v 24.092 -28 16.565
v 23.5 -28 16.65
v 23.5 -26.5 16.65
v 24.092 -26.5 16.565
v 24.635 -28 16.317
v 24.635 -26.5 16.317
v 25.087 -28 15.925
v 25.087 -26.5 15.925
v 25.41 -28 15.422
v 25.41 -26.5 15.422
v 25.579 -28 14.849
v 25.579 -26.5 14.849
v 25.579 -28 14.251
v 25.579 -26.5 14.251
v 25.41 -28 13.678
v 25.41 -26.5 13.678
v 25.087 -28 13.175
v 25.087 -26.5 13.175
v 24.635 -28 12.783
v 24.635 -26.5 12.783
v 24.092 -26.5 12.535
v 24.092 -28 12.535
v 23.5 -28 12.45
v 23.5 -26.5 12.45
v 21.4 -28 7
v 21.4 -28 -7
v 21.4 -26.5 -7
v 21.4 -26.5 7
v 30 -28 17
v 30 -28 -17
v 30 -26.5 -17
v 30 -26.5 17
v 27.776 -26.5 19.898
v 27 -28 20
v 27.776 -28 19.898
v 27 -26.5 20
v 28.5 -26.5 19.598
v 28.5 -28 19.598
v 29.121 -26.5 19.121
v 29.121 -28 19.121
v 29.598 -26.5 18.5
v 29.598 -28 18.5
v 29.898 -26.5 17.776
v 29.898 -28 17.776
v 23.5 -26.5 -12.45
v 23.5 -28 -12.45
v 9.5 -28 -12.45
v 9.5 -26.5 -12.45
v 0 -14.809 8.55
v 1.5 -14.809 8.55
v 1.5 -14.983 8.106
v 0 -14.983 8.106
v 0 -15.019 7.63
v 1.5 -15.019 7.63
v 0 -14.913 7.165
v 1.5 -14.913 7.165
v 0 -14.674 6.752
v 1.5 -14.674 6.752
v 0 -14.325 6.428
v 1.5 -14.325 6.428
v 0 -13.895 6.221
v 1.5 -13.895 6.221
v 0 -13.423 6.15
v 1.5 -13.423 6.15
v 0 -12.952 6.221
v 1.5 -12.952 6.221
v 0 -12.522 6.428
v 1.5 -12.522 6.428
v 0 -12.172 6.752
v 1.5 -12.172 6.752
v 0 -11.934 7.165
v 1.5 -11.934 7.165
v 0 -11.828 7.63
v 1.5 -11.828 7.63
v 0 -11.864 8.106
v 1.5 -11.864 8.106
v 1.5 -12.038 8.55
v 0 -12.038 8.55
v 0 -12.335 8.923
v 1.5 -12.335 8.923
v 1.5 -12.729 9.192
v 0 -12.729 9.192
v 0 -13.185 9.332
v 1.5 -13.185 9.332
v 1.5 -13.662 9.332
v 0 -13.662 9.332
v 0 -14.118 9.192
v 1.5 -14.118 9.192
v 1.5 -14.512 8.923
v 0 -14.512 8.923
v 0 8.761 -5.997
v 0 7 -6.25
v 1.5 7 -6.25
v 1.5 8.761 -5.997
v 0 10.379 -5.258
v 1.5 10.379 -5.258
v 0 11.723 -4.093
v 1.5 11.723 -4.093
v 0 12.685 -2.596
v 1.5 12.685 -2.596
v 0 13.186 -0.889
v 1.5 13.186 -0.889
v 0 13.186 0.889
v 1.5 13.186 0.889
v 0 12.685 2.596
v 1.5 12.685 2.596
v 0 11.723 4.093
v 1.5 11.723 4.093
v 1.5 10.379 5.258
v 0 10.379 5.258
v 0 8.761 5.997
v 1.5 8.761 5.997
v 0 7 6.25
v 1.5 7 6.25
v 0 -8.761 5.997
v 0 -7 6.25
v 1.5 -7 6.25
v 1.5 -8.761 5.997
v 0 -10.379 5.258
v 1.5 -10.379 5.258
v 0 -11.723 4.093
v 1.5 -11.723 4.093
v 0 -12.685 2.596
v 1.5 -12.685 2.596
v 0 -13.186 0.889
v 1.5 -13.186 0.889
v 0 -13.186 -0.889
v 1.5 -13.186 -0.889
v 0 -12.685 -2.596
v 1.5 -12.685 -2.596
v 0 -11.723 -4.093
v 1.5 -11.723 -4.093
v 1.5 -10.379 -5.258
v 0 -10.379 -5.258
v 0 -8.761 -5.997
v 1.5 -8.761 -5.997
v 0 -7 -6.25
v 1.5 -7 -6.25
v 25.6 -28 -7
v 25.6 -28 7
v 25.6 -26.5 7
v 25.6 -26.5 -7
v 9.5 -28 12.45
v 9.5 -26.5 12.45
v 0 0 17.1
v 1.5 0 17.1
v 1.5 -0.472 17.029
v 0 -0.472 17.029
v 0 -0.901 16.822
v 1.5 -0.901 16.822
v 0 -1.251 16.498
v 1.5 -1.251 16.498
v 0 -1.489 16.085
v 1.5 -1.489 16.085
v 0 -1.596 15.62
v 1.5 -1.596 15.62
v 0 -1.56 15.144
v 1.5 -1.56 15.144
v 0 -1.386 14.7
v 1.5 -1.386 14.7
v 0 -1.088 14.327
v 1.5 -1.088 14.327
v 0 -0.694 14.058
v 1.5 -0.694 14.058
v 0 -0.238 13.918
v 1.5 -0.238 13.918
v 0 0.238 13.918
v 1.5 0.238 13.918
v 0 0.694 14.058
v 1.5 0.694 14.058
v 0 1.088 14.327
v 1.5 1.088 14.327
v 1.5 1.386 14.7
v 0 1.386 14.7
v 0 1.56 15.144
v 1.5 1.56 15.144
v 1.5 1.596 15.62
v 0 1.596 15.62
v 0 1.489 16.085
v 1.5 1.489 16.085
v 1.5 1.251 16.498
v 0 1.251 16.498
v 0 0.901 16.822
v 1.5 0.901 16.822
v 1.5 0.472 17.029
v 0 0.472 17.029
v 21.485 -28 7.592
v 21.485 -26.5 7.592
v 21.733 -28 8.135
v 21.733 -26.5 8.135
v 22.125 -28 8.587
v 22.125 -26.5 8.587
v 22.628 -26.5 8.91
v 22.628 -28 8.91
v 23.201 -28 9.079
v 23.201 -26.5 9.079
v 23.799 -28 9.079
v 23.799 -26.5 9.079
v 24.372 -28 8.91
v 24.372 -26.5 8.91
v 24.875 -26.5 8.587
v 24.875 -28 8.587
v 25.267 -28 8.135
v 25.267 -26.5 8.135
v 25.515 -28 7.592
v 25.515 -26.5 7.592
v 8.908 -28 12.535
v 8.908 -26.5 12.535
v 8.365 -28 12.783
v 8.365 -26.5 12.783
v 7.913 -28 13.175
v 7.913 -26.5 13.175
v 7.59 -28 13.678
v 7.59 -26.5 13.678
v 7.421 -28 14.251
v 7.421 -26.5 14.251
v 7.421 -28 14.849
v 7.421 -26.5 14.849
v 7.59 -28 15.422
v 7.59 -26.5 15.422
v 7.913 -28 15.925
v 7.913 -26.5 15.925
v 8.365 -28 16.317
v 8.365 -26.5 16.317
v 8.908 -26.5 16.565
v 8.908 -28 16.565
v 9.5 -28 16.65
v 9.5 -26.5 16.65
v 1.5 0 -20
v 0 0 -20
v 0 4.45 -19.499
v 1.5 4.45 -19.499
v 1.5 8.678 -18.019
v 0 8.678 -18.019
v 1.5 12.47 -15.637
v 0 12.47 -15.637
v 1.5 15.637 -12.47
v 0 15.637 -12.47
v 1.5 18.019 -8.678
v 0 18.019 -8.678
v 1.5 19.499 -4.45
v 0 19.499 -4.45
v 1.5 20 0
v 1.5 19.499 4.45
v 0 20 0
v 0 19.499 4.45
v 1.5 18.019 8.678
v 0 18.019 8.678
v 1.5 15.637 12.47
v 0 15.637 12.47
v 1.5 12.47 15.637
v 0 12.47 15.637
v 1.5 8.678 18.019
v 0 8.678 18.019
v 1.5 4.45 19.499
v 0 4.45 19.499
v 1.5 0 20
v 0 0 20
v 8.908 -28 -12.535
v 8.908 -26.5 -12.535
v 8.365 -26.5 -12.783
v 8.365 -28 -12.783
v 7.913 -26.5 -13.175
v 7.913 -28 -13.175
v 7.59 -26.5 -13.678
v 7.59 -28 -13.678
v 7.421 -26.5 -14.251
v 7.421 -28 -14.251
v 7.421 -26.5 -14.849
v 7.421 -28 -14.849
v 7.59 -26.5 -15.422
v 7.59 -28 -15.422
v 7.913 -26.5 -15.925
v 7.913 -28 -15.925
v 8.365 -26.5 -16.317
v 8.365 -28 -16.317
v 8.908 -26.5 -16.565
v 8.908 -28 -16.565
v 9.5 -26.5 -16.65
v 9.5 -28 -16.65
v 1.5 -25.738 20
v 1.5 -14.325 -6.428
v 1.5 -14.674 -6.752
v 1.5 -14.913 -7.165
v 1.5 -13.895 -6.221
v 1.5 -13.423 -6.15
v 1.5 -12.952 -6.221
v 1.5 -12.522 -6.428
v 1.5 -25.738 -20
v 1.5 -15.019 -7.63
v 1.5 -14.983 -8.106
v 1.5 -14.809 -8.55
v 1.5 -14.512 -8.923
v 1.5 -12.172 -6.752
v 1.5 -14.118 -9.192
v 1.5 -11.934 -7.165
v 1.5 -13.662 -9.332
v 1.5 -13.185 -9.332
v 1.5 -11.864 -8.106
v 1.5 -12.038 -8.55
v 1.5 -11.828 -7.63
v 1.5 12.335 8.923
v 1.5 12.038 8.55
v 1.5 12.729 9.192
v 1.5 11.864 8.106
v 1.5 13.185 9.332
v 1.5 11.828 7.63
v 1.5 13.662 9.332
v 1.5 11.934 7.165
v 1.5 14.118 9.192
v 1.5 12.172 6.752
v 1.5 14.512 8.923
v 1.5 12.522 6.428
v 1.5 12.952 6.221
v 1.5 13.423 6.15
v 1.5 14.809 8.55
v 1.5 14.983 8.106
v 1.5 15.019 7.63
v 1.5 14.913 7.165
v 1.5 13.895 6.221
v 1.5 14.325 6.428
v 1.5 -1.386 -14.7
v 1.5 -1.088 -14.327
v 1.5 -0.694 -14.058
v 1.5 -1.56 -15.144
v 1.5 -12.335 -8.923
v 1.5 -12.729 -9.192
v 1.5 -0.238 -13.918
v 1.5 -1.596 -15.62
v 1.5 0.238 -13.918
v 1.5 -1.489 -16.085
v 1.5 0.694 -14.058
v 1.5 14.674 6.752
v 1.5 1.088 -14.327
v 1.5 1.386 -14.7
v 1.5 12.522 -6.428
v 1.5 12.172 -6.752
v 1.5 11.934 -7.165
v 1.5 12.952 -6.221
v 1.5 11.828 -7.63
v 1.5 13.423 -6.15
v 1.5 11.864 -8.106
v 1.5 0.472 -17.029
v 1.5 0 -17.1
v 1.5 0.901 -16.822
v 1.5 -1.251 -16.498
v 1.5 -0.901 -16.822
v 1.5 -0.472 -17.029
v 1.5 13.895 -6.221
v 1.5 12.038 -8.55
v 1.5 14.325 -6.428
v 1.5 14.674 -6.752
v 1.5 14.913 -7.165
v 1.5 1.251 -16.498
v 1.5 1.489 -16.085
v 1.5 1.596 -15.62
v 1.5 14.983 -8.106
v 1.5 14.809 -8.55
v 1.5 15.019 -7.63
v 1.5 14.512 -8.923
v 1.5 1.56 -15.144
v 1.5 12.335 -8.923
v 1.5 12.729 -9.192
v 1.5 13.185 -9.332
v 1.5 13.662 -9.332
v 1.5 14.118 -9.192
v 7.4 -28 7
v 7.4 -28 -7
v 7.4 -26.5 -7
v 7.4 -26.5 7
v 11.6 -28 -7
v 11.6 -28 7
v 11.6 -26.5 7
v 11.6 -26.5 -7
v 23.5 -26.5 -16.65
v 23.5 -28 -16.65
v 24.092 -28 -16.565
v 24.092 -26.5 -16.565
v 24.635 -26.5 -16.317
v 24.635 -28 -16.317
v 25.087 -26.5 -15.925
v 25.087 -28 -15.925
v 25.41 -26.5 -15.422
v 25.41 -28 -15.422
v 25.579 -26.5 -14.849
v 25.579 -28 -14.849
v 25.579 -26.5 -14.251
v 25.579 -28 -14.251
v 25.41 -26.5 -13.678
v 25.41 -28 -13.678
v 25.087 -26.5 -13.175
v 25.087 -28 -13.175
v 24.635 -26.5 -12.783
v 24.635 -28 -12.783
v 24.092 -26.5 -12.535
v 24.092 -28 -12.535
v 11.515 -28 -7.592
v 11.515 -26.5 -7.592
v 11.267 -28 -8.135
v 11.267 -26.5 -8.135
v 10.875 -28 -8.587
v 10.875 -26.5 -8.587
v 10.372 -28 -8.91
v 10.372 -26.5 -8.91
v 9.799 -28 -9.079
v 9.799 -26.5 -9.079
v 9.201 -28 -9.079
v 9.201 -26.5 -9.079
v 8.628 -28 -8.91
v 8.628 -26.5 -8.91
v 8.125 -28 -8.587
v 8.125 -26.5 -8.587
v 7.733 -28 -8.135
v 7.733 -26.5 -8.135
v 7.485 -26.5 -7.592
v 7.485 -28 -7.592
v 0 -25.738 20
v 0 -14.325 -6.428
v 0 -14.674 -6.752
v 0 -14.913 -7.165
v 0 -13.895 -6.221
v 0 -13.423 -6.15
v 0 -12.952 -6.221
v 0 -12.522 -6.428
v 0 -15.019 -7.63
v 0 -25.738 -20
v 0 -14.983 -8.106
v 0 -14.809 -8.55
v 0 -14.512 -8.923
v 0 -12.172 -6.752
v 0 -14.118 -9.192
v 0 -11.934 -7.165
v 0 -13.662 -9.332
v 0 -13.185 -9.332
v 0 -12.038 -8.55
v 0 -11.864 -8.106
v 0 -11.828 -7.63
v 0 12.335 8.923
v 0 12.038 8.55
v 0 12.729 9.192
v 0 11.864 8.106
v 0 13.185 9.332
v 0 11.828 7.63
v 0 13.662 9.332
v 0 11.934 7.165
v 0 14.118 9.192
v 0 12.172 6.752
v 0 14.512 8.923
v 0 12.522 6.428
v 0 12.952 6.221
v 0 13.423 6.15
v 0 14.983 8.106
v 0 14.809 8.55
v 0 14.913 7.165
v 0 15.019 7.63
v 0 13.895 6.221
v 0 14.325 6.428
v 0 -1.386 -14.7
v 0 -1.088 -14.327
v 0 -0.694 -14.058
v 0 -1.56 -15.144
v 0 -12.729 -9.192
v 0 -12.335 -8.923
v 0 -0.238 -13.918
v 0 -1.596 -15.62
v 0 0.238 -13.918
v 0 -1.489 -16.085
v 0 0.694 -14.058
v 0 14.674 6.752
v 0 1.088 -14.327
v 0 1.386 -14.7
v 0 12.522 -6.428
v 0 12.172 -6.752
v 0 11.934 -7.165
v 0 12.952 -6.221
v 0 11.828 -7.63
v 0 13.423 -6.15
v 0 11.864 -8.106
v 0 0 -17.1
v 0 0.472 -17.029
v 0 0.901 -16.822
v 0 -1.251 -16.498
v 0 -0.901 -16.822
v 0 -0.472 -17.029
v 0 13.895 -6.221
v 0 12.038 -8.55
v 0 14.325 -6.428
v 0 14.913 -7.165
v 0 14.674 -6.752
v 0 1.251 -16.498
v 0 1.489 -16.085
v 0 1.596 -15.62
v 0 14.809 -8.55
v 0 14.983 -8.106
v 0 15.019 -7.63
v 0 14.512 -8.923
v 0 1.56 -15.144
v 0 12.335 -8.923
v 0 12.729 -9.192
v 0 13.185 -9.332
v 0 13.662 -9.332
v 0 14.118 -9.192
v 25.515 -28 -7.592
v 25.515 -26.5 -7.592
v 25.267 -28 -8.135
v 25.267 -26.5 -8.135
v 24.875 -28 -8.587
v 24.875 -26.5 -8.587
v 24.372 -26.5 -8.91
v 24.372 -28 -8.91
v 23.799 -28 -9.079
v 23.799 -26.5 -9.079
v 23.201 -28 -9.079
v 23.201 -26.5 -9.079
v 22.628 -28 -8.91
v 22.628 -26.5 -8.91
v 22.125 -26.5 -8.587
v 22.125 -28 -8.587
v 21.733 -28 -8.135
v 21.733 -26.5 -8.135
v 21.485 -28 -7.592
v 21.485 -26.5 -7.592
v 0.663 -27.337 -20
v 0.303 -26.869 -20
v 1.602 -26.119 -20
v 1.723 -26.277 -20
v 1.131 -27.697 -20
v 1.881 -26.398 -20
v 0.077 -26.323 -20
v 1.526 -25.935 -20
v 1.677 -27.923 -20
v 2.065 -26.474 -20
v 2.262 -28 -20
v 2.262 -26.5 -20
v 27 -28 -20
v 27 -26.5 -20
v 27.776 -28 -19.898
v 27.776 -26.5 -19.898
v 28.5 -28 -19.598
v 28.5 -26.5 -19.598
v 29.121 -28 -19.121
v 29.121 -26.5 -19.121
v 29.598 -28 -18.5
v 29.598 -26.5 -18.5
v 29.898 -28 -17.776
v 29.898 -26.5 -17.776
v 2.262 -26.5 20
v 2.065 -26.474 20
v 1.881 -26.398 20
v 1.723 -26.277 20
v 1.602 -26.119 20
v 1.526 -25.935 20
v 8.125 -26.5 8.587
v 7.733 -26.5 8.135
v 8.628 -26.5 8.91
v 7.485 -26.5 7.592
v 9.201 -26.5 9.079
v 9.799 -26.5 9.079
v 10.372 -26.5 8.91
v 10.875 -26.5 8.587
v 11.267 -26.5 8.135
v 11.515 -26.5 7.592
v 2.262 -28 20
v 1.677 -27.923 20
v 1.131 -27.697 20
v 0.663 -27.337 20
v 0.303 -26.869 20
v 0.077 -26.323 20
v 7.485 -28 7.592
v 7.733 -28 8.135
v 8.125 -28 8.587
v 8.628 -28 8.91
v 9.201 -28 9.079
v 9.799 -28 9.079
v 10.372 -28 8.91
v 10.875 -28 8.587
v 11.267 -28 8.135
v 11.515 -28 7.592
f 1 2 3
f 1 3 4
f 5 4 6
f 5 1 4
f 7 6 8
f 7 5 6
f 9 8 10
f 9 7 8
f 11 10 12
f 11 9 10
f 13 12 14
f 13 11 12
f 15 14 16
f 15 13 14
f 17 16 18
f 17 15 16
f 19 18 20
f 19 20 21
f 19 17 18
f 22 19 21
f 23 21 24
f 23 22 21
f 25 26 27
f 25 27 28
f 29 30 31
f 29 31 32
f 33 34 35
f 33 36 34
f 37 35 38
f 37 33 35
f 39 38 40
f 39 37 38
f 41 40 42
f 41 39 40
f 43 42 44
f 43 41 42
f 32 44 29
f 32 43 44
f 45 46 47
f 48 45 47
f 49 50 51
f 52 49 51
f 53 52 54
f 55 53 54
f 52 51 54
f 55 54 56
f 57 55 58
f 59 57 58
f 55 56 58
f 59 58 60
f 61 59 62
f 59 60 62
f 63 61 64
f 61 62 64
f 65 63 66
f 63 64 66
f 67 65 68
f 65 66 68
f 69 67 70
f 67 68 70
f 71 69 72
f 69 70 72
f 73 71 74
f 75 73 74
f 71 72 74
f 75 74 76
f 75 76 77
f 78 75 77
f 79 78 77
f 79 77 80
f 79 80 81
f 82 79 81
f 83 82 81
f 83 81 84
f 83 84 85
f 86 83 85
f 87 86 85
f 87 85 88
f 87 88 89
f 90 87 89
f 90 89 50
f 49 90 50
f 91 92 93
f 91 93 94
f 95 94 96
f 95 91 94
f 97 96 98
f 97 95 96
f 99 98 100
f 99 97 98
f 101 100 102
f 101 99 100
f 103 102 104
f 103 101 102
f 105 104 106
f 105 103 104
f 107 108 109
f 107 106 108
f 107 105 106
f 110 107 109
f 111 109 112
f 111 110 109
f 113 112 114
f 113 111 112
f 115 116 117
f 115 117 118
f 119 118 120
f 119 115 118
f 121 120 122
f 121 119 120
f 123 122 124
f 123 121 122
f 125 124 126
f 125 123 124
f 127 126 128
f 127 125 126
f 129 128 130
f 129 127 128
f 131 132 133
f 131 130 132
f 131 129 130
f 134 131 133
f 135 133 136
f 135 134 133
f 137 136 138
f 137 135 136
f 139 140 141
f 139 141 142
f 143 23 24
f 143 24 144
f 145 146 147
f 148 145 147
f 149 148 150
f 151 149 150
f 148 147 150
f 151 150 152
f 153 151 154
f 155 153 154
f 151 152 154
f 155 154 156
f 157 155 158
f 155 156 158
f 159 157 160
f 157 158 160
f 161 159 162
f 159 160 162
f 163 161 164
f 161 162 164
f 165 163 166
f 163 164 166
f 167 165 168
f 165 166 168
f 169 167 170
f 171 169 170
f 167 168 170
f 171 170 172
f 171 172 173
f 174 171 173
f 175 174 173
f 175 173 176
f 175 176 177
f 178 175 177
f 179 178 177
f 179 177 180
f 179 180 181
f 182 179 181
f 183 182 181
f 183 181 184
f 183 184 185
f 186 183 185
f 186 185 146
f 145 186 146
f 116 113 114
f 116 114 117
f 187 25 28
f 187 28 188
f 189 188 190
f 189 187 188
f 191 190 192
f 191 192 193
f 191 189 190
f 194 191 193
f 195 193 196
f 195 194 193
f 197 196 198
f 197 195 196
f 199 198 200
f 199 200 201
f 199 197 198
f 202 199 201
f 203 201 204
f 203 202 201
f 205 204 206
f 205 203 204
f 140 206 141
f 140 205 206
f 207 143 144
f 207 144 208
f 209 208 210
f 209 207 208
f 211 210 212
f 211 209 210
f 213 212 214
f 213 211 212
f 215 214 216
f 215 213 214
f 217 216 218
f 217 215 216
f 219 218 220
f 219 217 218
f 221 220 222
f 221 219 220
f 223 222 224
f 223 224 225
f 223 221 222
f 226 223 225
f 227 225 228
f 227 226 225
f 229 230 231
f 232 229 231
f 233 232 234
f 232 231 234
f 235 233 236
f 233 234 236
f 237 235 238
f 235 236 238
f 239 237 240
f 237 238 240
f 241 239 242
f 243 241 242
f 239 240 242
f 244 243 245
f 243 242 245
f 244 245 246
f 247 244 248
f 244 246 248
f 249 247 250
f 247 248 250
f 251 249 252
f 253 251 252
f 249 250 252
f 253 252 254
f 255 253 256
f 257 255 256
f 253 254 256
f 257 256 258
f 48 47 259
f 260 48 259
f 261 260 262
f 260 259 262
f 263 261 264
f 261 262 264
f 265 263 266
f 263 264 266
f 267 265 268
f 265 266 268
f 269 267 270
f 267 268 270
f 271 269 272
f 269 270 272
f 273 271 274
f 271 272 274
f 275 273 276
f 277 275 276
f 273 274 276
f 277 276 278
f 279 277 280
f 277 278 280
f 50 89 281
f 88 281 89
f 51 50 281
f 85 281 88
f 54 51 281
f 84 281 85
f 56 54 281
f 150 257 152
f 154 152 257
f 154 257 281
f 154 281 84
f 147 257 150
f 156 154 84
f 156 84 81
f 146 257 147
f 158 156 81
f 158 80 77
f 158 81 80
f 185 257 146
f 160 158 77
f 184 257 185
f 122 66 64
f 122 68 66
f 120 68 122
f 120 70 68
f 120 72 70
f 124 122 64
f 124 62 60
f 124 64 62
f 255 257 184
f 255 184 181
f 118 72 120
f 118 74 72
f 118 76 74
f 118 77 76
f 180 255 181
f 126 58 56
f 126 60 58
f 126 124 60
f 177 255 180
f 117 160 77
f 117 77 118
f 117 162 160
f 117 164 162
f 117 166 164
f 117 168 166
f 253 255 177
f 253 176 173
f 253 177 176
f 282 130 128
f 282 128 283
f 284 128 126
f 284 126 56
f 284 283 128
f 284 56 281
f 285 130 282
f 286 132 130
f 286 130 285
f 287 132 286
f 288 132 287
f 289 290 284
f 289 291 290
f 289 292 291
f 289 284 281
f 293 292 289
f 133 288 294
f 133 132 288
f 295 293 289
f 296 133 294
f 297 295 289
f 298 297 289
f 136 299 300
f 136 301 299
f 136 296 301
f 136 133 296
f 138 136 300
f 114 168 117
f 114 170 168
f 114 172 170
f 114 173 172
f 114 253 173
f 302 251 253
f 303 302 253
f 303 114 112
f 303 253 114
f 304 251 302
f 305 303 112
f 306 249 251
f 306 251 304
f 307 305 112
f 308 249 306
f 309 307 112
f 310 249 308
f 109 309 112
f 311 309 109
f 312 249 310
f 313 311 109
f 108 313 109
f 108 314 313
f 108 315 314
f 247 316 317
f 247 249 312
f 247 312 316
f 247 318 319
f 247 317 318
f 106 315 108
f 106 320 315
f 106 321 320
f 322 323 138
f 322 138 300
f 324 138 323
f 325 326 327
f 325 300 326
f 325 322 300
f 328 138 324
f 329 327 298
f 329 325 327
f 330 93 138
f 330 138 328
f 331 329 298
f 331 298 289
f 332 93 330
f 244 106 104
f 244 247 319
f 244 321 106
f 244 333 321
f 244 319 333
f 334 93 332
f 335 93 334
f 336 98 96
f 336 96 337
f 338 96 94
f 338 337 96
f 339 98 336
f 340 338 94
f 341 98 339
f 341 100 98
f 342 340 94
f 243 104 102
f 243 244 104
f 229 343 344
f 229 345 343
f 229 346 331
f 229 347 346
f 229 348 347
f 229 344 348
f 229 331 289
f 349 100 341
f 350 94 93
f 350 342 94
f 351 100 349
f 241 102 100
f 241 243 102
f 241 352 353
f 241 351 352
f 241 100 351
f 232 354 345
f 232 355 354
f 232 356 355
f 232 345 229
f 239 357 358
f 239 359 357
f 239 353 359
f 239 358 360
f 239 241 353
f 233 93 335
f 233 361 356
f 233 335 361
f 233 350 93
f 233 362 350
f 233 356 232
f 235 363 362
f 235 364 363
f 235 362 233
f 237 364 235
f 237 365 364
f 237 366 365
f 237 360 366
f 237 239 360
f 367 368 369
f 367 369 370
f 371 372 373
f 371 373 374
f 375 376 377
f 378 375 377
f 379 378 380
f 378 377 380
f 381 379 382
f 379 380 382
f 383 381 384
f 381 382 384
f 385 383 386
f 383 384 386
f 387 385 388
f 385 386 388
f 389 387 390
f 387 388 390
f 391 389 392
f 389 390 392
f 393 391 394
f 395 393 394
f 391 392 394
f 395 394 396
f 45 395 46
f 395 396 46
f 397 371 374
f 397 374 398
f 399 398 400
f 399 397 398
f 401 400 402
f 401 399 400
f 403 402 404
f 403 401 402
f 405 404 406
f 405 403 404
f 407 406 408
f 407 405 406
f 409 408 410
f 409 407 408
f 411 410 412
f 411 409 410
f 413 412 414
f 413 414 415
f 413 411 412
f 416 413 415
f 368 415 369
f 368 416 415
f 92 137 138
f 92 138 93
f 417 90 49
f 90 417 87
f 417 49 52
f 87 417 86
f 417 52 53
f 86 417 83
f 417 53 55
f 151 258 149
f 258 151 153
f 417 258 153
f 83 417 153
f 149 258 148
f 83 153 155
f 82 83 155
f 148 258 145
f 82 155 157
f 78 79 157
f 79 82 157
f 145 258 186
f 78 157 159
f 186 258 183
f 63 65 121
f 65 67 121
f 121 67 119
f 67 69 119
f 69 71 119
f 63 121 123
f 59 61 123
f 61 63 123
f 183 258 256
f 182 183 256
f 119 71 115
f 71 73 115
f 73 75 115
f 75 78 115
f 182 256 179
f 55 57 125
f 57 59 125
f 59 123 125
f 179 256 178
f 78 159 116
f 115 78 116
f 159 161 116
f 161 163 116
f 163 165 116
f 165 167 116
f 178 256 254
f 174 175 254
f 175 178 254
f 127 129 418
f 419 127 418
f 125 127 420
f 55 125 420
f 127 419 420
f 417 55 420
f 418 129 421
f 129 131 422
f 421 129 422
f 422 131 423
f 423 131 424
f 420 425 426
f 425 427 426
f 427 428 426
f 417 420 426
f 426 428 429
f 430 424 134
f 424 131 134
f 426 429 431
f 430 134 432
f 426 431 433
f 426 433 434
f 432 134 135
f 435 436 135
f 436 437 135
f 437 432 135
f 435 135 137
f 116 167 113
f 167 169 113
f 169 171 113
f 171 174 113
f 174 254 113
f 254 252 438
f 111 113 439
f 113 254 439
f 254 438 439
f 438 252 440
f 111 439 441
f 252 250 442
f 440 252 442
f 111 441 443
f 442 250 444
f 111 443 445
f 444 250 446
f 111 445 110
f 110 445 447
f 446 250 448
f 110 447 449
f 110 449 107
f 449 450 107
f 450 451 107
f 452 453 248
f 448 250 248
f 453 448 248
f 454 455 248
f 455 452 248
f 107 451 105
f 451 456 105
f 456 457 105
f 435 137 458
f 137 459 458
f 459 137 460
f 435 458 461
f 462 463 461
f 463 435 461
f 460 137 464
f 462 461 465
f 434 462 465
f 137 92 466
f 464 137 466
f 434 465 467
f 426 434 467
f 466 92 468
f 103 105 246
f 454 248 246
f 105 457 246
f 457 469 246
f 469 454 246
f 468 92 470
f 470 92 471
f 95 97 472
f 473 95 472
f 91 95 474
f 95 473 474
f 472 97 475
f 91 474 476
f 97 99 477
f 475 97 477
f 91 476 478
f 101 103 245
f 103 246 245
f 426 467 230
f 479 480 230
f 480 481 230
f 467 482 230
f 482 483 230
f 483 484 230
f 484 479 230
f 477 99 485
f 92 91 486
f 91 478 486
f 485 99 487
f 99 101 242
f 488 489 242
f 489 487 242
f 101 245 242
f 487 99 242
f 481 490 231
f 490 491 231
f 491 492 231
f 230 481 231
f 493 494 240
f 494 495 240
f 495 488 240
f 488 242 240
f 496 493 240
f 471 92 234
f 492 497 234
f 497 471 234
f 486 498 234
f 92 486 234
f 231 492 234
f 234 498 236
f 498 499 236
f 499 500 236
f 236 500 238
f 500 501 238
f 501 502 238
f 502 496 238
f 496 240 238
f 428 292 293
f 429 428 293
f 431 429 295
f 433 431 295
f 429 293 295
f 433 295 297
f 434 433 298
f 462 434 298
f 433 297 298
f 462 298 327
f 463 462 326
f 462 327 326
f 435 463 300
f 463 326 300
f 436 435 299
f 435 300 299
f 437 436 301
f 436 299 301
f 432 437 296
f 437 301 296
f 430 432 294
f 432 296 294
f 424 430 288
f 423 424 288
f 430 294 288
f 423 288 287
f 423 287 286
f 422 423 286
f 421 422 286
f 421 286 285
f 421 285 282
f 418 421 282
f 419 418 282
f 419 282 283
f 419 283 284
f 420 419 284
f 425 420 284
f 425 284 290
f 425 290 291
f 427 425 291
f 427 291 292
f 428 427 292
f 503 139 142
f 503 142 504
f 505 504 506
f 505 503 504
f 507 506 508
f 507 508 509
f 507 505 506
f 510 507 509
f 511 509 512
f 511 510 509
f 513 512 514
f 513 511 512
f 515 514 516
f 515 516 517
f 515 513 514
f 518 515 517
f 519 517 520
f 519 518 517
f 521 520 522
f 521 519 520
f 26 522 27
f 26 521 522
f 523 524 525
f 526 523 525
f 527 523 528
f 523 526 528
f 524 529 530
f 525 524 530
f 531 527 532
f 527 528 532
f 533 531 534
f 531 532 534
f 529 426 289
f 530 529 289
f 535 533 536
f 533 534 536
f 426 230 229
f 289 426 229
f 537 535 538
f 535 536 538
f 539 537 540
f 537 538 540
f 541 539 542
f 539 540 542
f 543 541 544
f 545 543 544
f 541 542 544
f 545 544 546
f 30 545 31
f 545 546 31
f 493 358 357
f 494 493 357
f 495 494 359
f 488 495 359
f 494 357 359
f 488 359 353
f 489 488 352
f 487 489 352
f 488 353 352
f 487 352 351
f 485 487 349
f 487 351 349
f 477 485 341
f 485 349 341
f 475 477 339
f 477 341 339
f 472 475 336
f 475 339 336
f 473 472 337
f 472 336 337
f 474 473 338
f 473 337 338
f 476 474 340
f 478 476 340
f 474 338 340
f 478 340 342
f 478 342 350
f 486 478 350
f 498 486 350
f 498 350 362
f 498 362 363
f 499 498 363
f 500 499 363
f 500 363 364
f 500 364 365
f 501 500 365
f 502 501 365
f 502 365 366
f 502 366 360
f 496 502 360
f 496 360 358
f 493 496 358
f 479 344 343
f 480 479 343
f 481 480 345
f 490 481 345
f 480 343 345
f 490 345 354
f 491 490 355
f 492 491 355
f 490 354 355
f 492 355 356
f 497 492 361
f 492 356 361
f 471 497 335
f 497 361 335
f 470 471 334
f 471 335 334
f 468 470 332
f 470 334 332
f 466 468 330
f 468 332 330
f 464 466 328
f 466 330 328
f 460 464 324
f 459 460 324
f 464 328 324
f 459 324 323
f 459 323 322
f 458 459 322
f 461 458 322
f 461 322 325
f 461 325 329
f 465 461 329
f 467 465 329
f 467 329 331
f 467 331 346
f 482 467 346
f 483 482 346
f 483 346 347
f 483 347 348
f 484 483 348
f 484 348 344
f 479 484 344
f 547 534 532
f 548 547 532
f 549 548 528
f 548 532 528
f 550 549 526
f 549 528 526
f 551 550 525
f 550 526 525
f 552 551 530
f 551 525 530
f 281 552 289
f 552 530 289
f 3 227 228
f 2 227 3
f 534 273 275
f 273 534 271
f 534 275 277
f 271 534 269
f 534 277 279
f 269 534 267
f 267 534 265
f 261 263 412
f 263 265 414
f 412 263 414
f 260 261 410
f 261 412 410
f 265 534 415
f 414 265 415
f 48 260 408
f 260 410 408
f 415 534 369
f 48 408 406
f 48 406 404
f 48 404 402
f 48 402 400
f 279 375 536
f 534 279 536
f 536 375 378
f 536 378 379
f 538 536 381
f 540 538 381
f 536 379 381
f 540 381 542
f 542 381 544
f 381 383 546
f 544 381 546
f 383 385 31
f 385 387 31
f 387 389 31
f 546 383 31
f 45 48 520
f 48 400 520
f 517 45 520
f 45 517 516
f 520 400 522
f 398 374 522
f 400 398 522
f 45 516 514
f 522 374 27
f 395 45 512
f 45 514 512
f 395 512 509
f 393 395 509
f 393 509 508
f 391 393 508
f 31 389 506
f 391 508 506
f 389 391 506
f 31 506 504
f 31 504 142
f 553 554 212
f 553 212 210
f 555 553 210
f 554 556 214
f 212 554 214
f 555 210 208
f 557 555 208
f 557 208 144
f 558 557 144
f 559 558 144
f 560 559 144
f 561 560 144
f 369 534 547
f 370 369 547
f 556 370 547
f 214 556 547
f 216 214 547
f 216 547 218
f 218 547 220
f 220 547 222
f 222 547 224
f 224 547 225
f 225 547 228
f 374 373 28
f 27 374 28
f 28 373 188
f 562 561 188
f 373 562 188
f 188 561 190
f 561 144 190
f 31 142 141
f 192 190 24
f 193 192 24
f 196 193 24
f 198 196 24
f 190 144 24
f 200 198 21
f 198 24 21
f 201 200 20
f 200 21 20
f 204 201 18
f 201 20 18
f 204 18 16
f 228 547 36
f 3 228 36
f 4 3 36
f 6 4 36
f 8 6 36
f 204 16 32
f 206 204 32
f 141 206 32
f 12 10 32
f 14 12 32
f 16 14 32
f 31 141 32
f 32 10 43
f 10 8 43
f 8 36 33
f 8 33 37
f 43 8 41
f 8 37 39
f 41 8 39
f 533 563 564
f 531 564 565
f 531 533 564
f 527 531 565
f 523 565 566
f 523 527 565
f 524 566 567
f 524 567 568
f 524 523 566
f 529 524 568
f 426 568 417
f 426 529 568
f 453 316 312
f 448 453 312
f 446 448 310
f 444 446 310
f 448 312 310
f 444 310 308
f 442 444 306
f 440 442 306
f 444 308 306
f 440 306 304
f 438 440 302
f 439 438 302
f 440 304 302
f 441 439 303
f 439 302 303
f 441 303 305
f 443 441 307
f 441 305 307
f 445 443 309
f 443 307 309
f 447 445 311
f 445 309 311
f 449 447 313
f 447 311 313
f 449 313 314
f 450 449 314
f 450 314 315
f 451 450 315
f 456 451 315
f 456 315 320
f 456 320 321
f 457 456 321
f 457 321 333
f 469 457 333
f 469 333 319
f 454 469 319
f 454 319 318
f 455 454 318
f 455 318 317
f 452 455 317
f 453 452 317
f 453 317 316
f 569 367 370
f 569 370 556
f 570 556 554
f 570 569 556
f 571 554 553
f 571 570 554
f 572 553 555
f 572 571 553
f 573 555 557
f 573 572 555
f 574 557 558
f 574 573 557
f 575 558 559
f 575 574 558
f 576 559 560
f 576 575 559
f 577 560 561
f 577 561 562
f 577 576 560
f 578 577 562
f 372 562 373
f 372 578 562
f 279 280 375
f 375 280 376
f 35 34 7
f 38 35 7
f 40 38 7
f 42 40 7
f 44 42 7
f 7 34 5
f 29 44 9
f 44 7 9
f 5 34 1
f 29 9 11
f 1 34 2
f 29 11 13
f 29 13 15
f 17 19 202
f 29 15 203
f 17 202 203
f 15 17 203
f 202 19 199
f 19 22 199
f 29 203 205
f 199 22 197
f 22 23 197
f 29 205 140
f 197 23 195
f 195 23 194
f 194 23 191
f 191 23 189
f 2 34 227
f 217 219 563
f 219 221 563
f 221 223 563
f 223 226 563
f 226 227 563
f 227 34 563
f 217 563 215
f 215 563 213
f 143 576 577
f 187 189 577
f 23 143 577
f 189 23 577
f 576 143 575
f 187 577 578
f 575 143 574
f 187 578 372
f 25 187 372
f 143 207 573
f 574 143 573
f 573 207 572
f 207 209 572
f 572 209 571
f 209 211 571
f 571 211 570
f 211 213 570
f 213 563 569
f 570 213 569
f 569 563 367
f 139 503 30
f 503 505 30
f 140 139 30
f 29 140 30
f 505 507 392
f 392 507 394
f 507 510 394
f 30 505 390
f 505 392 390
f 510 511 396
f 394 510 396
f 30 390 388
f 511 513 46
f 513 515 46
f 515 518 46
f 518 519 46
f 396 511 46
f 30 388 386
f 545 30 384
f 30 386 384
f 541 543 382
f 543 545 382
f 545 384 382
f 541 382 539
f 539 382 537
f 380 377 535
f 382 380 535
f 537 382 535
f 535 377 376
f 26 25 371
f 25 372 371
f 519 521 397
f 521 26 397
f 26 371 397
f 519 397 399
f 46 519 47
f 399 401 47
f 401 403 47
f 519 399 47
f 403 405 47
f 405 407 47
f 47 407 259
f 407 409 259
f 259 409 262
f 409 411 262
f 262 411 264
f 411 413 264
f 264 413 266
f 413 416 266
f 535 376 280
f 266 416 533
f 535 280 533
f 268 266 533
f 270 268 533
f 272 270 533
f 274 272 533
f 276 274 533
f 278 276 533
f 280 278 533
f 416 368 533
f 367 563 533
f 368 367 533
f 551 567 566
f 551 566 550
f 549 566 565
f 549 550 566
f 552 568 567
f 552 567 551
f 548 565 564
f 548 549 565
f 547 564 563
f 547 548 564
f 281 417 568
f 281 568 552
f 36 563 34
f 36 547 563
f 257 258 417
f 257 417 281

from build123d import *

# Parameters (mm, degrees)
BOSS_EXTRUDE1_DEPTH    = 1.5
SKETCH2_W              = 30
SKETCH2_H              = 40
BOSS_EXTRUDE2_DEPTH    = 1.5
CONVERT_SOLID1_START   = -20
CONVERT_SOLID1_DEPTH   = 40
CONVERT_SOLID1_2_DEPTH = 40
M3_CLEARANCE_HOLE1_D   = 3.2
CIRPATTERN1_COUNT      = 6
CUT_EXTRUDE1_DEPTH     = 46.650848842
FILLET1_R              = 3
CUT_EXTRUDE2_DEPTH     = 1.5


# Read off the part's stored shape, not the designer's step: Convert-Solid1
with BuildPart() as part:
    # Sketch1 → Boss-Extrude1 (new body)
    with BuildSketch(Plane(origin=(0, 0, 0), x_dir=(0, 0, -1), z_dir=(1, 0, 0))):
        with BuildLine():
            Line((-20, 0), (-20, -28))
            Line((-20, -28), (20, -28))
            Line((20, -28), (20, 0))
            ThreePointArc((20, 0), (0, 20), (-20, 0))
        make_face()
    extrude(amount=BOSS_EXTRUDE1_DEPTH)

    # Sketch2 → Boss-Extrude2 (add)
    with BuildSketch(Plane.XZ.offset(28)):
        with Locations((15, 0)):
            Rectangle(SKETCH2_W, SKETCH2_H)
    extrude(amount=-BOSS_EXTRUDE2_DEPTH)

    # Convert-Solid1 outline → Convert-Solid1 (cut)
    with BuildSketch(Plane.XY.offset(CONVERT_SOLID1_START)):
        with BuildLine():
            Line((0, -28), (2.262, -28))
            ThreePointArc((2.262, -28), (0.662524461, -27.337475539), (0, -25.738))
            Line((0, -25.738), (0, -28))
        make_face()
    extrude(amount=CONVERT_SOLID1_DEPTH, mode=Mode.SUBTRACT)

    # Convert-Solid1 2 outline → Convert-Solid1 2 (add)
    with BuildSketch(Plane.XY.offset(CONVERT_SOLID1_START)):
        with BuildLine():
            Line((1.5, -26.5), (2.262, -26.5))
            ThreePointArc((2.262, -26.5), (1.723184633, -26.276815367), (1.5, -25.738))
            Line((1.5, -25.738), (1.5, -26.5))
        make_face()
    extrude(amount=CONVERT_SOLID1_2_DEPTH)

    # M3 Clearance Hole1 (through all)
    with Locations(Plane.ZY):
        with Locations((-15.5, 0)):
            m3_clearance_hole1 = Hole(M3_CLEARANCE_HOLE1_D / 2)

    # CirPattern1: M3 Clearance Hole1 ×6 about axis
    cirpattern1_axis = Axis((0, 0, 0), (1, 0, 0))
    for i in range(1, CIRPATTERN1_COUNT):
        add(m3_clearance_hole1.rotate(cirpattern1_axis, i * 360 / CIRPATTERN1_COUNT), mode=Mode.SUBTRACT)

    # Sketch9 → Cut-Extrude1 (cut, through all)
    with BuildSketch(Plane.ZY):
        with BuildLine():
            Line((6.25, 7), (6.25, -7))
            ThreePointArc((6.25, -7), (0, -13.25), (-6.25, -7))
            Line((-6.25, -7), (-6.25, 7))
            ThreePointArc((-6.25, 7), (0, 13.25), (6.25, 7))
        make_face()
    extrude(amount=-CUT_EXTRUDE1_DEPTH, mode=Mode.SUBTRACT)

    # Fillet1
    fillet1_edges = [part.edges().sort_by_distance(p)[0] for p in [
        (30, -27.25, 20),
        (30, -27.25, -20),
    ]]
    fillet(fillet1_edges, radius=FILLET1_R)

    # Sketch10 → Cut-Extrude2 (cut)
    with BuildSketch(Plane(origin=(0, -28, 0), x_dir=(-1, 0, 0), z_dir=(0, -1, 0))):
        with BuildLine():
            Line((-9.5, -16.65), (-23.5, -16.65))
            ThreePointArc((-23.5, -16.65), (-25.6, -14.55), (-23.5, -12.45))
            Line((-23.5, -12.45), (-9.5, -12.45))
            ThreePointArc((-9.5, -12.45), (-7.4, -14.55), (-9.5, -16.65))
        make_face()
        with BuildLine():
            Line((-7.4, 7), (-7.4, -7))
            ThreePointArc((-7.4, -7), (-9.5, -9.1), (-11.6, -7))
            Line((-11.6, -7), (-11.6, 7))
            ThreePointArc((-11.6, 7), (-9.5, 9.1), (-7.4, 7))
        make_face()
        with BuildLine():
            Line((-21.4, 7), (-21.4, -7))
            ThreePointArc((-21.4, -7), (-23.5, -9.1), (-25.6, -7))
            Line((-25.6, -7), (-25.6, 7))
            ThreePointArc((-25.6, 7), (-23.5, 9.1), (-21.4, 7))
        make_face()
        with BuildLine():
            Line((-9.5, 16.65), (-23.5, 16.65))
            ThreePointArc((-23.5, 16.65), (-25.6, 14.55), (-23.5, 12.45))
            Line((-23.5, 12.45), (-9.5, 12.45))
            ThreePointArc((-9.5, 12.45), (-7.4, 14.55), (-9.5, 16.65))
        make_face()
    extrude(amount=-CUT_EXTRUDE2_DEPTH, mode=Mode.SUBTRACT)


solid = part.part
